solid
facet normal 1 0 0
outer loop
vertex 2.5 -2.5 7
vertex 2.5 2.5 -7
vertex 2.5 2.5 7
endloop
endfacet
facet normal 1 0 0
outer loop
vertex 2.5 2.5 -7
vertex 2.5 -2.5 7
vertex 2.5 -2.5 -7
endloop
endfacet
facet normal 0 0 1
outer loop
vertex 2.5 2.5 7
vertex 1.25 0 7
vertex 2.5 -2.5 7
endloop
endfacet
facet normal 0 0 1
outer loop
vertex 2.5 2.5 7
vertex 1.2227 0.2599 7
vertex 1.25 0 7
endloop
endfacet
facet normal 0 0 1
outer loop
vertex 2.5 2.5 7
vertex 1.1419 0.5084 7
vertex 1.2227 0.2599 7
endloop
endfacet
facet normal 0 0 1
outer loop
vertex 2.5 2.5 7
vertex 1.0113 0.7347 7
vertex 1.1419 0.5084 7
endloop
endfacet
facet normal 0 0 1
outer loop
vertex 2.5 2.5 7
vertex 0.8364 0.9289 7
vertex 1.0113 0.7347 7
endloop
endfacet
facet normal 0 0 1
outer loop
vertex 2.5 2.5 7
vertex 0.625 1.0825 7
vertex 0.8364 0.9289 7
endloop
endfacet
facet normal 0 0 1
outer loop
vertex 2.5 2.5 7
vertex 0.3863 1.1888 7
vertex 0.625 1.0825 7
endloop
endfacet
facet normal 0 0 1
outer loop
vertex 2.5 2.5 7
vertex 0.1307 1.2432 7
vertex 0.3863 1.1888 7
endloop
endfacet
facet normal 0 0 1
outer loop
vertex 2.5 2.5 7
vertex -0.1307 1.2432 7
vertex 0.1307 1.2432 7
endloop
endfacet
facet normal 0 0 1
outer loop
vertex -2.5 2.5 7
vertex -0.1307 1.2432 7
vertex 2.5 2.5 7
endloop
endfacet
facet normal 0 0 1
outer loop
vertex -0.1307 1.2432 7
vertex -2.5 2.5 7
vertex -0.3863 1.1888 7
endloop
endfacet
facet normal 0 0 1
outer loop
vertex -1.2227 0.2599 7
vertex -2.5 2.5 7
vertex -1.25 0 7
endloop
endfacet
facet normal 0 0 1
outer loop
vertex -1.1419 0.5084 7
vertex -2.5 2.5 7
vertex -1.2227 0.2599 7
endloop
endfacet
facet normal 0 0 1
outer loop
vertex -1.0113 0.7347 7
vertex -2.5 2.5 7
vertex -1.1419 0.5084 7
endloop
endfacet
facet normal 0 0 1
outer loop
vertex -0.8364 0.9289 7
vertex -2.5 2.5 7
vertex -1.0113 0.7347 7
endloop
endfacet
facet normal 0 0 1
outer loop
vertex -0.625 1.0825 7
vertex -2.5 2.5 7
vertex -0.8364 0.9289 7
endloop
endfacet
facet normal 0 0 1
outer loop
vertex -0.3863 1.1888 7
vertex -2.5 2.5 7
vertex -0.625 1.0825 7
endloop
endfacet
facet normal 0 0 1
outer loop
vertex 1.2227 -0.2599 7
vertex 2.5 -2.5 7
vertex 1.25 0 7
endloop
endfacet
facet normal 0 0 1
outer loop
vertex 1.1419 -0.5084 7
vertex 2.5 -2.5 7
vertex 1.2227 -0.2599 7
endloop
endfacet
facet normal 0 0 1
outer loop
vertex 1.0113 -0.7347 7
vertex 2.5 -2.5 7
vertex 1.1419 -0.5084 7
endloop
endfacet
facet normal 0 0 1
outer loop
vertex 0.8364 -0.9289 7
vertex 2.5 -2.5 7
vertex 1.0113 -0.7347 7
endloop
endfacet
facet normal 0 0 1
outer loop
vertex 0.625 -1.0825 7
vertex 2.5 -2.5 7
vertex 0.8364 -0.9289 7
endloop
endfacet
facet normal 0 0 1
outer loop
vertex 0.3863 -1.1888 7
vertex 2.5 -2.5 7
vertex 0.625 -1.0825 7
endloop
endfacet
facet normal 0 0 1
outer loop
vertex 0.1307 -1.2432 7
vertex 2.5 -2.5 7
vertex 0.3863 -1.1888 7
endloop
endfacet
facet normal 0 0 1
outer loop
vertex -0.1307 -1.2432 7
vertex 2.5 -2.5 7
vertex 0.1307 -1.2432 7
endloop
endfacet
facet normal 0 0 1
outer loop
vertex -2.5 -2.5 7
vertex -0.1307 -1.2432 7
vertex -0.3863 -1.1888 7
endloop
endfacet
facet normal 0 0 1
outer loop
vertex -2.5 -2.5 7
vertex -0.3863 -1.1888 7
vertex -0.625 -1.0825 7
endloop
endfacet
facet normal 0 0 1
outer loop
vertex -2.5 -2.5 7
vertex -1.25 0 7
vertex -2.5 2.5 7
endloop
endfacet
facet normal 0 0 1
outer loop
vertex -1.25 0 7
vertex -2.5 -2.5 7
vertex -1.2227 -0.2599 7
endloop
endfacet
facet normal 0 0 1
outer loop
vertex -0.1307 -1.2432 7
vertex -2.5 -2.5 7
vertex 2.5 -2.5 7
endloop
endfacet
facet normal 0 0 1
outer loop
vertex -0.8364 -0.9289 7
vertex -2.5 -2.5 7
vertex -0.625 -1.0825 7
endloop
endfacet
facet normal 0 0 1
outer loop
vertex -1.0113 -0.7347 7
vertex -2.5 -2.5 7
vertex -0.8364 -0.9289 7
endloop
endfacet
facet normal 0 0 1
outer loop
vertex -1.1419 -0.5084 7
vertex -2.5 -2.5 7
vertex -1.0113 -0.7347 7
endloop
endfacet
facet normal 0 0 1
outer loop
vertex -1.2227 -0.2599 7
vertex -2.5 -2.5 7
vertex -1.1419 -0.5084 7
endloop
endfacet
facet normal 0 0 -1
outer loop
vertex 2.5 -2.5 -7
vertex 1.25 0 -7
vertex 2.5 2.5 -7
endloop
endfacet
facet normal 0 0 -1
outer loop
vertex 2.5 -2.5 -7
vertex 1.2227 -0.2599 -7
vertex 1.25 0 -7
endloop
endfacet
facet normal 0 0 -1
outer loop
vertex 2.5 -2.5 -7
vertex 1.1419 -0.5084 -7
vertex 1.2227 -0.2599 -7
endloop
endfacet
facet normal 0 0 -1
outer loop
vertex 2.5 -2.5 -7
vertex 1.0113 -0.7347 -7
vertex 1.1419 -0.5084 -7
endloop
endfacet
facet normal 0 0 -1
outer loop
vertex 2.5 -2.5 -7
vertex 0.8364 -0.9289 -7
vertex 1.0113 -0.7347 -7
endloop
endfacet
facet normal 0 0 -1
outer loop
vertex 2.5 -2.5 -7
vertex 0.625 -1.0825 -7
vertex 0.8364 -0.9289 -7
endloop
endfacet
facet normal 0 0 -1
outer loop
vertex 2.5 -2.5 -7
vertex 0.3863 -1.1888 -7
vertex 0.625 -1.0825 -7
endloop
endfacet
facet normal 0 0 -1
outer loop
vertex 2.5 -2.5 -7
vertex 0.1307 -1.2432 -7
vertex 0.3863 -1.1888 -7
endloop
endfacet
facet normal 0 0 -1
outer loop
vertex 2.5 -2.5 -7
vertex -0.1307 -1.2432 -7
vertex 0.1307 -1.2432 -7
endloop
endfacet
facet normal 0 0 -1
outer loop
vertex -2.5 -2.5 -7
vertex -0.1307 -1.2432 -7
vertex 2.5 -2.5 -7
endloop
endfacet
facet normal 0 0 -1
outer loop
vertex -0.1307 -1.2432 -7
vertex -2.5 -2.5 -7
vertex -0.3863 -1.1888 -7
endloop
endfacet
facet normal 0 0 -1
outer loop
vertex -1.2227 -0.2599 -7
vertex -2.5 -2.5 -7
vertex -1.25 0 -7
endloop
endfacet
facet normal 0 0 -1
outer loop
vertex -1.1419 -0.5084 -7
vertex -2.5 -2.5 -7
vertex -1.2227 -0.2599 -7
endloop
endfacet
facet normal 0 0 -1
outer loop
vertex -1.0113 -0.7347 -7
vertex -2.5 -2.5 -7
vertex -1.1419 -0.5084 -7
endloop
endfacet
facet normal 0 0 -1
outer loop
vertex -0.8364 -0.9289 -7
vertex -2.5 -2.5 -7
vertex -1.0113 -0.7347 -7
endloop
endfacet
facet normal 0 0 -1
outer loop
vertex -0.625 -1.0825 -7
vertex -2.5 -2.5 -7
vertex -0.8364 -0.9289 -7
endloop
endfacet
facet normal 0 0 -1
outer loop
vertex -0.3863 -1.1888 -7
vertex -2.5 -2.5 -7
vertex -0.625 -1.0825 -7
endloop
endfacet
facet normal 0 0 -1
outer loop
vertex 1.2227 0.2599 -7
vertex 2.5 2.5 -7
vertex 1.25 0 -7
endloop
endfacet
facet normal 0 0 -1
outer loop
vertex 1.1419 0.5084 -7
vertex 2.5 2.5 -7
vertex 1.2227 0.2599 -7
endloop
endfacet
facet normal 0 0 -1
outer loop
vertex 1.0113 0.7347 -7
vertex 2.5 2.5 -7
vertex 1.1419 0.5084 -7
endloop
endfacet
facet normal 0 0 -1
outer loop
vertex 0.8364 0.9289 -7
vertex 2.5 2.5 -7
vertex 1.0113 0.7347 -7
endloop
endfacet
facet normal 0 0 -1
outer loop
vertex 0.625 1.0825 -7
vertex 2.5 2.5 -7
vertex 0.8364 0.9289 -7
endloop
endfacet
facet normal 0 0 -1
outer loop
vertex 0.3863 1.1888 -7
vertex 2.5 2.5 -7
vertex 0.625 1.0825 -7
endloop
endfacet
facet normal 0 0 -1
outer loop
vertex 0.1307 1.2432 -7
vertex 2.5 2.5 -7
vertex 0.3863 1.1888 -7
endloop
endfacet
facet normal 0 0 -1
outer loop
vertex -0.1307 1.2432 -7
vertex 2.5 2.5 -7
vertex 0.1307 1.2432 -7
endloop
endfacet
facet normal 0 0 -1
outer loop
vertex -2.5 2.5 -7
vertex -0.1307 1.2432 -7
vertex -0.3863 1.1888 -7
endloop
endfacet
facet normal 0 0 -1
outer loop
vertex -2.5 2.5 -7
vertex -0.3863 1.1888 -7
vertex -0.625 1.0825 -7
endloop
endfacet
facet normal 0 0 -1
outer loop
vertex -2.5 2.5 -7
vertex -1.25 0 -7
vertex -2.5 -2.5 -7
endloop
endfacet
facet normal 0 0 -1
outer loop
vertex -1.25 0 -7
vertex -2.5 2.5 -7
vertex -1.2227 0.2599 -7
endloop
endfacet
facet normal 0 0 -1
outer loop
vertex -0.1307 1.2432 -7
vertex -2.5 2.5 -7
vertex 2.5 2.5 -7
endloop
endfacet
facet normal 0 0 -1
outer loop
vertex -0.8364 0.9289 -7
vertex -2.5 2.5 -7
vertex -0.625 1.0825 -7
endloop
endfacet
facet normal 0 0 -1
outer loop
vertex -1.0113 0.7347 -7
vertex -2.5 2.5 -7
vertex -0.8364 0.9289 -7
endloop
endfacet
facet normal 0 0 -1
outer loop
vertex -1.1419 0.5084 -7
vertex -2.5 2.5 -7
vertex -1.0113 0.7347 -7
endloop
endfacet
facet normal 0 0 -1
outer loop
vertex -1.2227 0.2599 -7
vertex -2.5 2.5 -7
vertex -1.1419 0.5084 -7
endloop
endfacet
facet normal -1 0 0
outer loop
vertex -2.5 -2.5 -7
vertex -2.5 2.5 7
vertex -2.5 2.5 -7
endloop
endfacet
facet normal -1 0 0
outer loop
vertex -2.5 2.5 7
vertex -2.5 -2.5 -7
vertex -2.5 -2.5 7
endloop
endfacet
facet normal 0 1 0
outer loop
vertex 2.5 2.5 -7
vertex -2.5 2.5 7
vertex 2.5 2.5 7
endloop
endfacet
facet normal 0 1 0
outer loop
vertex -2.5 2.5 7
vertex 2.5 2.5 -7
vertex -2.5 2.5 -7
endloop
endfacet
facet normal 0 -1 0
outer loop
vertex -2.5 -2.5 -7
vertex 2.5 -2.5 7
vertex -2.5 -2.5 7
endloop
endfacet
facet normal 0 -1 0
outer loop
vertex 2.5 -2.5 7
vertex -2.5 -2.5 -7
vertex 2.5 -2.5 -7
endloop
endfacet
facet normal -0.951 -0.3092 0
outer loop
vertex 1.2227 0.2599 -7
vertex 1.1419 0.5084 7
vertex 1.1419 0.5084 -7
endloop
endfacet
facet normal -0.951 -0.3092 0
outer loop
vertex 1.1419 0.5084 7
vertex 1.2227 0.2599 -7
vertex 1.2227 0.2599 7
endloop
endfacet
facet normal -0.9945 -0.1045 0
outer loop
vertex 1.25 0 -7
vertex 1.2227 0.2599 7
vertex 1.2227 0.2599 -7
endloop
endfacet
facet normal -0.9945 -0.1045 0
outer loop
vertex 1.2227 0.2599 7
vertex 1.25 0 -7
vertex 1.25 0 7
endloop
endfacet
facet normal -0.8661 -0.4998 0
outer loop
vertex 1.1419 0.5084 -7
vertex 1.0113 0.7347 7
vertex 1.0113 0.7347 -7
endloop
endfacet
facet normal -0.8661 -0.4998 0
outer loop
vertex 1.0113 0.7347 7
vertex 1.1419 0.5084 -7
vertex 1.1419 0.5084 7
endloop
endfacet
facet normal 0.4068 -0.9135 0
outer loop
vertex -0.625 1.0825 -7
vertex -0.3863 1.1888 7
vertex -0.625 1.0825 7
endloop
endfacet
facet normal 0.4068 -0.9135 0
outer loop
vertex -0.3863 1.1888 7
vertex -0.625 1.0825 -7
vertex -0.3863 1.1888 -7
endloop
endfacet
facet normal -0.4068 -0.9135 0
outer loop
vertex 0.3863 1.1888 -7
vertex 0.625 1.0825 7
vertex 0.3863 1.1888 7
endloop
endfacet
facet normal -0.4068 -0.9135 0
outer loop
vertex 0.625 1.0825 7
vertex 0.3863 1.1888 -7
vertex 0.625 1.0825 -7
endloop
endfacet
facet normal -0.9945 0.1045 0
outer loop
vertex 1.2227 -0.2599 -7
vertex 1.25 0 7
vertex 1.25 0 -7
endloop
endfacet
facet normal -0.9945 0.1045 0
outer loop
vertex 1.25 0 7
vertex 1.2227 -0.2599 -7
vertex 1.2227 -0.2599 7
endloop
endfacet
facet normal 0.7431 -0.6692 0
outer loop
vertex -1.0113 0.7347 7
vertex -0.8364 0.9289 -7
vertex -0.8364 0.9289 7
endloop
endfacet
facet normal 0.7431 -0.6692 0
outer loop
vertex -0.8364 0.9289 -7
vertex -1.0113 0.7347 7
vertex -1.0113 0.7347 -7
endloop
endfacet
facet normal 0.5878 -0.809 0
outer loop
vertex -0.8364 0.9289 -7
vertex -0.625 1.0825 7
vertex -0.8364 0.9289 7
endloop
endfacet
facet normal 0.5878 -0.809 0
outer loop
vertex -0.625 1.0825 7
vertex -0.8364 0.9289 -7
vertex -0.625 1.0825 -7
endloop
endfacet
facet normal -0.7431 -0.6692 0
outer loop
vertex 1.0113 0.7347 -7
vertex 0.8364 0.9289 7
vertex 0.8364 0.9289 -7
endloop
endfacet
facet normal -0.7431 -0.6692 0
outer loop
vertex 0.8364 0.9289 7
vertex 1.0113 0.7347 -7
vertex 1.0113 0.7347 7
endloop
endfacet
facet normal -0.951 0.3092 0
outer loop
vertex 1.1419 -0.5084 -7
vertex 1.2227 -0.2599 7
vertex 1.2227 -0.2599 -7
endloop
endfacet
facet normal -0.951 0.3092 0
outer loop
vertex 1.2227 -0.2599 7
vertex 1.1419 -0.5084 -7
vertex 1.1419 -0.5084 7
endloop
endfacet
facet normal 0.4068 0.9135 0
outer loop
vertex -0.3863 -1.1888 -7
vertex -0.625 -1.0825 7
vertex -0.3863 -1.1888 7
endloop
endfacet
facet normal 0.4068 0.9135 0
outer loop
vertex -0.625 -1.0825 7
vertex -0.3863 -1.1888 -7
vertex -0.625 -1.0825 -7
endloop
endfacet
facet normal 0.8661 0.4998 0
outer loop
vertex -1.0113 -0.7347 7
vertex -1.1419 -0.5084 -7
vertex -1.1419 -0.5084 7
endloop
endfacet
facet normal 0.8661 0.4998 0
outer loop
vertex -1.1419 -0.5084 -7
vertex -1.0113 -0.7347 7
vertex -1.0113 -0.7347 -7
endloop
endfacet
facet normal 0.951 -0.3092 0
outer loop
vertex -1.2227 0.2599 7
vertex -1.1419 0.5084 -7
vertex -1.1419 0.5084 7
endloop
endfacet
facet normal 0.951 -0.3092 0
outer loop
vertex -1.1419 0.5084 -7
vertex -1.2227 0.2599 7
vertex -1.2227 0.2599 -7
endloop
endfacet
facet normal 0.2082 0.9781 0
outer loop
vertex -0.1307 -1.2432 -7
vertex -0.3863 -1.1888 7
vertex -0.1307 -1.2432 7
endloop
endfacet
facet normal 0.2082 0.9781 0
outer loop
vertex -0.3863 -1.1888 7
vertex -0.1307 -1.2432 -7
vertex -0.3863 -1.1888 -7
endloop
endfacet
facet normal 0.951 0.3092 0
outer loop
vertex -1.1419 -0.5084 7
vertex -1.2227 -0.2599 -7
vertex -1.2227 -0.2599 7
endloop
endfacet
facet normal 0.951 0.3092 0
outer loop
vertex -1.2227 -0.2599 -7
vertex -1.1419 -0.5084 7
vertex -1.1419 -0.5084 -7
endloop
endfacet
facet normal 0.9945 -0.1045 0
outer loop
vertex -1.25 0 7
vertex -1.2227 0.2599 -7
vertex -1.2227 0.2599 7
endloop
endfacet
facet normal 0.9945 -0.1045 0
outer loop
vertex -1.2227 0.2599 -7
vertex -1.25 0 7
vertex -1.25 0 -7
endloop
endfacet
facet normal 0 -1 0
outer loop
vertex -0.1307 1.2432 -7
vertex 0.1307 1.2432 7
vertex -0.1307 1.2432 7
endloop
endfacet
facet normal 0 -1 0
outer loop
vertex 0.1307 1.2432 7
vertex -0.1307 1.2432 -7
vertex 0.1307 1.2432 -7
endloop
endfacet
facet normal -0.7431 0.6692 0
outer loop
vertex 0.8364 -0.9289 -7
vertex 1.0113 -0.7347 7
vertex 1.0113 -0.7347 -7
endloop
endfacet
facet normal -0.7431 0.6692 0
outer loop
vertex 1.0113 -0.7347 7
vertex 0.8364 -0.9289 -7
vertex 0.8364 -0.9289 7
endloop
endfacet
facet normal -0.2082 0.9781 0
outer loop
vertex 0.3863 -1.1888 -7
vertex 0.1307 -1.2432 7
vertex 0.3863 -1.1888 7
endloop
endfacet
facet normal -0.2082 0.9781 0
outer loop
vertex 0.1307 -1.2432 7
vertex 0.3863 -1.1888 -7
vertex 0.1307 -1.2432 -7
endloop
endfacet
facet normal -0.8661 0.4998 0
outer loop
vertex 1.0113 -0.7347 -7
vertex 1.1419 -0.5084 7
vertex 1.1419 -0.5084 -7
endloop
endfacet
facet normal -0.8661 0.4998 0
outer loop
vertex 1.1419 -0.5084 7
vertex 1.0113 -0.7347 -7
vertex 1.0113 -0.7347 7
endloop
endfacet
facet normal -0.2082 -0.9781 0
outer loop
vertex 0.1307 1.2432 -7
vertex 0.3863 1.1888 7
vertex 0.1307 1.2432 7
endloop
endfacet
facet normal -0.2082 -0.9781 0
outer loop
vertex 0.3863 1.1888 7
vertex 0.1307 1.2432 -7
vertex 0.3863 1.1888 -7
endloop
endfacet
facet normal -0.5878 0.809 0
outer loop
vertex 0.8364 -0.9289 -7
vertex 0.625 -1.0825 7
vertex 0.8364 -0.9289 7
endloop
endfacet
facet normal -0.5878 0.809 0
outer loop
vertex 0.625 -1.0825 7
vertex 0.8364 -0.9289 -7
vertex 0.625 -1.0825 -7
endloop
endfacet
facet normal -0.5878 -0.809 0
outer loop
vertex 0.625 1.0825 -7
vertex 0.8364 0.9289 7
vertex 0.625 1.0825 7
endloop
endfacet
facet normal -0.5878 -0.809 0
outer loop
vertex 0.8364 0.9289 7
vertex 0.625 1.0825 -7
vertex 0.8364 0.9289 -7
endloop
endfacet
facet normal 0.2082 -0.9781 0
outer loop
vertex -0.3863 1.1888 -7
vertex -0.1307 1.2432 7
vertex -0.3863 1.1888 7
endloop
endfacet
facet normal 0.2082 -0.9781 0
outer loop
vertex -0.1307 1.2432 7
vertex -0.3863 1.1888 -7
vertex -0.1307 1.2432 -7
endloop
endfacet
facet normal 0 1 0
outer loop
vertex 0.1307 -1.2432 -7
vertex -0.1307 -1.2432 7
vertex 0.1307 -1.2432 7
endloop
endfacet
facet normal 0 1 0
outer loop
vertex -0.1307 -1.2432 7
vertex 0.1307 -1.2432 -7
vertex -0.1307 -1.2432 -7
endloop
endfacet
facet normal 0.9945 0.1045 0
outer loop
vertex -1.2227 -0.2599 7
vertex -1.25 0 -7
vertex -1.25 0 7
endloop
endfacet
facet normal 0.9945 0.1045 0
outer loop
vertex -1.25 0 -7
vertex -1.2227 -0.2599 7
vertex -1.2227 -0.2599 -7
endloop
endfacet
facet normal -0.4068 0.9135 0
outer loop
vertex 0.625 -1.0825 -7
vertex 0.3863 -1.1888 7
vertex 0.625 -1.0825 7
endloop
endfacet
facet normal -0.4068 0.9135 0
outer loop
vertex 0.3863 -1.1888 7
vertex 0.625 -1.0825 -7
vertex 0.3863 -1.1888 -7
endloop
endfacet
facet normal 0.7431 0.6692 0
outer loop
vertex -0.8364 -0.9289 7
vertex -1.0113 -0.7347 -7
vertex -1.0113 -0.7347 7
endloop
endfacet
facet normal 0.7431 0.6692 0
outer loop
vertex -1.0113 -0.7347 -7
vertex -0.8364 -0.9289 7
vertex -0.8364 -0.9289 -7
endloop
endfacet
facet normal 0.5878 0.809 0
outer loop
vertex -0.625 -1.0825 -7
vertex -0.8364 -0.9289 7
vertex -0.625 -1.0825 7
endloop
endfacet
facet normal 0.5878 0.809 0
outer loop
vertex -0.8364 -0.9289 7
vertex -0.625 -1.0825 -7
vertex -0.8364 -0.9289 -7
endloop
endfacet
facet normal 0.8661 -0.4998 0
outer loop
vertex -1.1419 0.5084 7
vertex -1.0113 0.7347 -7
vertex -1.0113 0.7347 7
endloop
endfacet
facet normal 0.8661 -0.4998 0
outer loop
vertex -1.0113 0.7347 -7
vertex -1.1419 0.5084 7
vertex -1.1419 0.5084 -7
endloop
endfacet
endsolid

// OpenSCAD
/*
BSD 2-Clause License

Copyright (c) 2024, John Winans

Redistribution and use in source and binary forms, with or without
modification, are permitted provided that the following conditions are met:

1. Redistributions of source code must retain the above copyright notice, this
   list of conditions and the following disclaimer.

2. Redistributions in binary form must reproduce the above copyright notice,
   this list of conditions and the following disclaimer in the documentation
   and/or other materials provided with the distribution.

THIS SOFTWARE IS PROVIDED BY THE COPYRIGHT HOLDERS AND CONTRIBUTORS "AS IS"
AND ANY EXPRESS OR IMPLIED WARRANTIES, INCLUDING, BUT NOT LIMITED TO, THE
IMPLIED WARRANTIES OF MERCHANTABILITY AND FITNESS FOR A PARTICULAR PURPOSE ARE
DISCLAIMED. IN NO EVENT SHALL THE COPYRIGHT HOLDER OR CONTRIBUTORS BE LIABLE
FOR ANY DIRECT, INDIRECT, INCIDENTAL, SPECIAL, EXEMPLARY, OR CONSEQUENTIAL
DAMAGES (INCLUDING, BUT NOT LIMITED TO, PROCUREMENT OF SUBSTITUTE GOODS OR
SERVICES; LOSS OF USE, DATA, OR PROFITS; OR BUSINESS INTERRUPTION) HOWEVER
CAUSED AND ON ANY THEORY OF LIABILITY, WHETHER IN CONTRACT, STRICT LIABILITY,
OR TORT (INCLUDING NEGLIGENCE OR OTHERWISE) ARISING IN ANY WAY OUT OF THE USE
OF THIS SOFTWARE, EVEN IF ADVISED OF THE POSSIBILITY OF SUCH DAMAGE.
*/

// This is a 3D printable standoff suitable for stacking boards on
// the Z80 Retro!


M25_dia=2.5;        // hole diameter for a self-threaded M2.5 bolt
standoff_height=14; // total height of the standoff

$fn=30;             // make sure the center is round (make it have 30 facets)

standoff();

module standoff()
{
    difference()
    {
        cube([5,5,standoff_height], center=true);
        cylinder(d=M25_dia, h=standoff_height+1, center=true);
    }
}
